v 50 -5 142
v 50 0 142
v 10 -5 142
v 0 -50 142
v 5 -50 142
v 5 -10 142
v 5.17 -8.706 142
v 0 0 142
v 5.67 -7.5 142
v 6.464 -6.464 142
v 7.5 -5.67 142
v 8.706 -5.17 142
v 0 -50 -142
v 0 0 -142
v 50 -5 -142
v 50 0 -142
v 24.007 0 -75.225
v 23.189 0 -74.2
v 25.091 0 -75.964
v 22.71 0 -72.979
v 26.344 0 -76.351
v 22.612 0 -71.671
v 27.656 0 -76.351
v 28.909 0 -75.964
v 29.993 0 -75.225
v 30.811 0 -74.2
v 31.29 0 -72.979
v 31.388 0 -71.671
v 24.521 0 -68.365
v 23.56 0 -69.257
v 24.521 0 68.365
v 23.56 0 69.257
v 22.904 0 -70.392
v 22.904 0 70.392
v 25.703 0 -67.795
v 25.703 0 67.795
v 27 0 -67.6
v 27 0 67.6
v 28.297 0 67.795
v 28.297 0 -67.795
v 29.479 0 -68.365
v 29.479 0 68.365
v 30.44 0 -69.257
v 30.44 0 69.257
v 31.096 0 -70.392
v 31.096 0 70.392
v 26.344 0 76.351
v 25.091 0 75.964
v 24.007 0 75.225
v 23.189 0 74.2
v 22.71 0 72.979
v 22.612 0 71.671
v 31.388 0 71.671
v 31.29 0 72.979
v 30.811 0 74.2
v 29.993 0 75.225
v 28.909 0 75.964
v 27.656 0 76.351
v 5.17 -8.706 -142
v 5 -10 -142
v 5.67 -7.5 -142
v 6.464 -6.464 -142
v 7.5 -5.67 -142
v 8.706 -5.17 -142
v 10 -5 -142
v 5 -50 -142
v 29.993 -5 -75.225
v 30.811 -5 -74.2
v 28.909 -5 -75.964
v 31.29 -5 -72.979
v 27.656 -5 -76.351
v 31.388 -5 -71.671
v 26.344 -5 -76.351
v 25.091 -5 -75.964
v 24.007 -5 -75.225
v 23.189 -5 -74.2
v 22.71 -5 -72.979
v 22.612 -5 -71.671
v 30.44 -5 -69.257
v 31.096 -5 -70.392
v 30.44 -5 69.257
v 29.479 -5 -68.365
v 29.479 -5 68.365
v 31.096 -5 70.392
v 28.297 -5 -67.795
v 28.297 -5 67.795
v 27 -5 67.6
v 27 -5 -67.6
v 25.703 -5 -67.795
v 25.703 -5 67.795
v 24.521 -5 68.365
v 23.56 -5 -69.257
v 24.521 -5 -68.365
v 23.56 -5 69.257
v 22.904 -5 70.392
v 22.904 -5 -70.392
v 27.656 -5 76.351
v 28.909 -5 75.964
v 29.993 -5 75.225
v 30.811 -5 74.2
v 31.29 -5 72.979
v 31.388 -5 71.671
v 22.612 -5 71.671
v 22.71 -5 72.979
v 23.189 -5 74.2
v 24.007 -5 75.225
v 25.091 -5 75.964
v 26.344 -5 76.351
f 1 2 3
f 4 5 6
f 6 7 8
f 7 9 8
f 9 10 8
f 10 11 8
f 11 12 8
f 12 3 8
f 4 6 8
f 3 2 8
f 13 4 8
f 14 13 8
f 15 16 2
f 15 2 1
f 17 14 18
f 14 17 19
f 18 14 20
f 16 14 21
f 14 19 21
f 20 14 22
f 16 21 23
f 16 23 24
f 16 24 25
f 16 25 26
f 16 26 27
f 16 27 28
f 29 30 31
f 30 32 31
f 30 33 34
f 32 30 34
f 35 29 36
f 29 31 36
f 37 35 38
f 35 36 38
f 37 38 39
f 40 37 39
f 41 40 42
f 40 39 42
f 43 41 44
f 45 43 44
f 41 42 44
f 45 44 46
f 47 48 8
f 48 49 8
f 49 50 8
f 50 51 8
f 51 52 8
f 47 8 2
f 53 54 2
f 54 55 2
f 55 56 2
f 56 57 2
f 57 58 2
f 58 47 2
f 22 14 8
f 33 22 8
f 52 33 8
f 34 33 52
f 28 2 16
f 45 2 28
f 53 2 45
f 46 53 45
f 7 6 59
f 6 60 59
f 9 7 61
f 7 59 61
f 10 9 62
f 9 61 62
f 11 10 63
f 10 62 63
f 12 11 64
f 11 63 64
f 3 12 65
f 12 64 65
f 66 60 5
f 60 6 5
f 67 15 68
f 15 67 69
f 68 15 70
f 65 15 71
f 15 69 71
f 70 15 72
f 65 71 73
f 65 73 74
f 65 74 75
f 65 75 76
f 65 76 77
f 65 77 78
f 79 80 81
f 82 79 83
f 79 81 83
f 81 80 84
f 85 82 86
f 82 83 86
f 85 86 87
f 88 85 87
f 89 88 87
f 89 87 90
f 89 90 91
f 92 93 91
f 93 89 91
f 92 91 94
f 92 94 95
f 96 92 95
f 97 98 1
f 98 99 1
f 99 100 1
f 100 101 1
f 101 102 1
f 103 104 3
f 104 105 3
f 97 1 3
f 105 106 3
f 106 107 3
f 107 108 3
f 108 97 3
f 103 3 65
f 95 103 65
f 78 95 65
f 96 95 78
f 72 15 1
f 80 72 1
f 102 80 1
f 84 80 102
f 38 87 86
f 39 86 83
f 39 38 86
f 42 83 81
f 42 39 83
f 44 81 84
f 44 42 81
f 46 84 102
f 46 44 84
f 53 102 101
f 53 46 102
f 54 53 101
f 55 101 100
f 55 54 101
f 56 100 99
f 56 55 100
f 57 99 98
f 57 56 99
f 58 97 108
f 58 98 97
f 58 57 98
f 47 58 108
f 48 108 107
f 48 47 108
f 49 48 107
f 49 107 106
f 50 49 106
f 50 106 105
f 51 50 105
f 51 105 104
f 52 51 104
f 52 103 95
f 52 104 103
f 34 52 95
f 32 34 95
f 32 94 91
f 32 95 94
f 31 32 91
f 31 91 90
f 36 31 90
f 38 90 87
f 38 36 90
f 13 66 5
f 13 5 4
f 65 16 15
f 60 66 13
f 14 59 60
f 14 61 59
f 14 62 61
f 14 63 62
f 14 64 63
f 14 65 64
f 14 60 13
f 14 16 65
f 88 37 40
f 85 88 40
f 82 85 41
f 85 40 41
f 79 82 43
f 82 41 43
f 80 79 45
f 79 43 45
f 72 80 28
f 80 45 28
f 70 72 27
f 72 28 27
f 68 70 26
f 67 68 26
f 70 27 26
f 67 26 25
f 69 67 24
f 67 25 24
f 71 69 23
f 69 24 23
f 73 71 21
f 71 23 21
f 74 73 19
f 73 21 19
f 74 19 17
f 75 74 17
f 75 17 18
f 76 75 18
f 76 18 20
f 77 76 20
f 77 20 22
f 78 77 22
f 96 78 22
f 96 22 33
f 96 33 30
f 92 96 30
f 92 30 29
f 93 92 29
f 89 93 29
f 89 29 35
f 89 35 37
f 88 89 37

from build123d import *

# Parameters (mm, degrees)
EXTRUDE_1_DEPTH     = 142
FILLET_1_R          = 5
SKETCH_2_R          = 4.4
CUT_EXTRUDE_1_DEPTH = 10


with BuildPart() as part:
    # Эскиз1 → Бобышка-Вытянуть1 (new, symmetric)
    with BuildSketch(Plane.XY):
        Polygon((0, 0), (50, 0), (50, -5), (5, -5), (5, -50), (0, -50), align=None)
    extrude(amount=EXTRUDE_1_DEPTH, both=True)

    # Скругление1
    fillet_1_edges = [part.edges().sort_by_distance(p)[0] for p in [
        (5, -5, 0),
    ]]
    fillet(fillet_1_edges, radius=FILLET_1_R)

    # Эскиз2 → Вырез-Вытянуть1 (cut)
    with BuildSketch(Plane(origin=(0, 0, 0), x_dir=(1, 0, 0), z_dir=(0, 1, 0))):
        with Locations(Location((27, 72, 0), (0, 0, 270))):
            Circle(SKETCH_2_R)
    cut_extrude_1 = extrude(amount=-CUT_EXTRUDE_1_DEPTH, mode=Mode.SUBTRACT)

    # Зеркальное отражение1: Вырез-Вытянуть1 across plane
    add(cut_extrude_1.mirror(Plane.XY), mode=Mode.SUBTRACT)


solid = part.part
